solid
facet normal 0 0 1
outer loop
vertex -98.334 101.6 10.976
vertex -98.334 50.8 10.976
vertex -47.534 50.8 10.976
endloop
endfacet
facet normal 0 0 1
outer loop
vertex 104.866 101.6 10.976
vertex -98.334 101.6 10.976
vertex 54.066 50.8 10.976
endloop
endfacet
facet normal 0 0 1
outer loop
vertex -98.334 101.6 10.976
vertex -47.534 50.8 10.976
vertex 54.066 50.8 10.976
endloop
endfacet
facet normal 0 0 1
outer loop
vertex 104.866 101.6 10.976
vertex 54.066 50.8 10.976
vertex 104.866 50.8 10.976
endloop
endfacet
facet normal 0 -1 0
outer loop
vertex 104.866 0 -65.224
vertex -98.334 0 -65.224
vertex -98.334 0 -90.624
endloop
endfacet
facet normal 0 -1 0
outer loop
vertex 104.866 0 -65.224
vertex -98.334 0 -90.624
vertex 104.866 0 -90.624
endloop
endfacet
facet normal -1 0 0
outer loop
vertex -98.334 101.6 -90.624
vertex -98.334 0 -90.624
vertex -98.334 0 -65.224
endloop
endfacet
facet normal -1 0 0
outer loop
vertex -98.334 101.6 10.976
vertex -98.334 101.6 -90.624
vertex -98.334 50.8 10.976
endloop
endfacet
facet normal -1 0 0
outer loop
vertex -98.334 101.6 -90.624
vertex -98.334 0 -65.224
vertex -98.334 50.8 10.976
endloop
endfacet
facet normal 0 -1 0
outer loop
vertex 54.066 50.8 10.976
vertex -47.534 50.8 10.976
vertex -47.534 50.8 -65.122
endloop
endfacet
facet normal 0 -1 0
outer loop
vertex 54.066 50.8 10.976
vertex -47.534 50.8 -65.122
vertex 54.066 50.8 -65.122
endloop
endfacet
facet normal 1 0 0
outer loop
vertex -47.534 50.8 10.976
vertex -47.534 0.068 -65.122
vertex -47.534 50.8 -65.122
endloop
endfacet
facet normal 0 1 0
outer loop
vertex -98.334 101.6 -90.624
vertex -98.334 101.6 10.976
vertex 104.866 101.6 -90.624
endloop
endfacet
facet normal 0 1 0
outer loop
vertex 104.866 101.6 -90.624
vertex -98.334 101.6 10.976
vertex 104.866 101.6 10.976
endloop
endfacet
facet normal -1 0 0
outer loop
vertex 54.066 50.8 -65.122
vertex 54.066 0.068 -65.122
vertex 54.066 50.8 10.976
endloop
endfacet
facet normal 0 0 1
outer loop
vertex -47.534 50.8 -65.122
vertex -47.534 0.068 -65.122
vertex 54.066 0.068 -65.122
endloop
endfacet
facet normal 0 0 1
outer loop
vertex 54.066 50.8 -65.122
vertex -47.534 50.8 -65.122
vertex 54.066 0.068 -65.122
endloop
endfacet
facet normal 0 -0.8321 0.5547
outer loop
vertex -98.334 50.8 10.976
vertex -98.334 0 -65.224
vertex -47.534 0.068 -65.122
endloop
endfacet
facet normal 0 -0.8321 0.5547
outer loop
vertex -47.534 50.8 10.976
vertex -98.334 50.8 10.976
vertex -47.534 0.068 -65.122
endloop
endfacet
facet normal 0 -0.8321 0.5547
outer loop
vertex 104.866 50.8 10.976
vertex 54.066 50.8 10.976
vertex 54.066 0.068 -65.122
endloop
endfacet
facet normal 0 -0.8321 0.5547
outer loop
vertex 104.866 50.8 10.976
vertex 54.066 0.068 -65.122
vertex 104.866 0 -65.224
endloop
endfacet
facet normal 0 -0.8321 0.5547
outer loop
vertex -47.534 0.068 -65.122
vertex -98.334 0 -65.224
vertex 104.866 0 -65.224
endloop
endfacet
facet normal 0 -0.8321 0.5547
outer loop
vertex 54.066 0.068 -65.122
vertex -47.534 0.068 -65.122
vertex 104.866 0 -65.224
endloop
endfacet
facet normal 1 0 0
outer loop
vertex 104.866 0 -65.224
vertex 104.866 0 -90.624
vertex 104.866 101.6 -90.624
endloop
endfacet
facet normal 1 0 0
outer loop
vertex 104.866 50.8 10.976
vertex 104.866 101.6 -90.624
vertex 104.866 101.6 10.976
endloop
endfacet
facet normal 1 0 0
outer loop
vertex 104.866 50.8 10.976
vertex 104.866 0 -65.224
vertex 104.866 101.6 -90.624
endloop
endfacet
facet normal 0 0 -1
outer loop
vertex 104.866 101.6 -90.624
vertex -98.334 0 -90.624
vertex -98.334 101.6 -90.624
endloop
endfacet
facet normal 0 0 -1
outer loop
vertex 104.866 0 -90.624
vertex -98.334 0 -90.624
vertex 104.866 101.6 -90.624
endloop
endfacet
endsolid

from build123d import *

# Parameters (mm, degrees)
F0_W     = 203.2
F0_H     = 101.6
F1_DEPTH = 101.6
F2_SIZE2 = 76.2
F2_SIZE  = 50.8
F3_W     = 101.6
F3_H     = 76.2
F4_DEPTH = 50.8


with BuildPart() as f1:
    # F0 (on Front) → F1 (new body)
    with BuildSketch(Plane.XZ):
        with Locations((3.265716, -39.823574)):
            Rectangle(F0_W, F0_H)
    extrude(amount=-F1_DEPTH)

    # F2
    f2_edges = [f1.edges().sort_by_distance(p)[0] for p in [
        (3.265716, 0, 10.976426),
    ]]
    chamfer(f2_edges, length=F2_SIZE, length2=F2_SIZE2)

    # F3 (on Front) → F4 (cut)
    with BuildSketch(Plane.XZ):
        with Locations((3.265716, -27.022086)):
            Rectangle(F3_W, F3_H)
    extrude(amount=-F4_DEPTH, mode=Mode.SUBTRACT)


solid = f1.part
